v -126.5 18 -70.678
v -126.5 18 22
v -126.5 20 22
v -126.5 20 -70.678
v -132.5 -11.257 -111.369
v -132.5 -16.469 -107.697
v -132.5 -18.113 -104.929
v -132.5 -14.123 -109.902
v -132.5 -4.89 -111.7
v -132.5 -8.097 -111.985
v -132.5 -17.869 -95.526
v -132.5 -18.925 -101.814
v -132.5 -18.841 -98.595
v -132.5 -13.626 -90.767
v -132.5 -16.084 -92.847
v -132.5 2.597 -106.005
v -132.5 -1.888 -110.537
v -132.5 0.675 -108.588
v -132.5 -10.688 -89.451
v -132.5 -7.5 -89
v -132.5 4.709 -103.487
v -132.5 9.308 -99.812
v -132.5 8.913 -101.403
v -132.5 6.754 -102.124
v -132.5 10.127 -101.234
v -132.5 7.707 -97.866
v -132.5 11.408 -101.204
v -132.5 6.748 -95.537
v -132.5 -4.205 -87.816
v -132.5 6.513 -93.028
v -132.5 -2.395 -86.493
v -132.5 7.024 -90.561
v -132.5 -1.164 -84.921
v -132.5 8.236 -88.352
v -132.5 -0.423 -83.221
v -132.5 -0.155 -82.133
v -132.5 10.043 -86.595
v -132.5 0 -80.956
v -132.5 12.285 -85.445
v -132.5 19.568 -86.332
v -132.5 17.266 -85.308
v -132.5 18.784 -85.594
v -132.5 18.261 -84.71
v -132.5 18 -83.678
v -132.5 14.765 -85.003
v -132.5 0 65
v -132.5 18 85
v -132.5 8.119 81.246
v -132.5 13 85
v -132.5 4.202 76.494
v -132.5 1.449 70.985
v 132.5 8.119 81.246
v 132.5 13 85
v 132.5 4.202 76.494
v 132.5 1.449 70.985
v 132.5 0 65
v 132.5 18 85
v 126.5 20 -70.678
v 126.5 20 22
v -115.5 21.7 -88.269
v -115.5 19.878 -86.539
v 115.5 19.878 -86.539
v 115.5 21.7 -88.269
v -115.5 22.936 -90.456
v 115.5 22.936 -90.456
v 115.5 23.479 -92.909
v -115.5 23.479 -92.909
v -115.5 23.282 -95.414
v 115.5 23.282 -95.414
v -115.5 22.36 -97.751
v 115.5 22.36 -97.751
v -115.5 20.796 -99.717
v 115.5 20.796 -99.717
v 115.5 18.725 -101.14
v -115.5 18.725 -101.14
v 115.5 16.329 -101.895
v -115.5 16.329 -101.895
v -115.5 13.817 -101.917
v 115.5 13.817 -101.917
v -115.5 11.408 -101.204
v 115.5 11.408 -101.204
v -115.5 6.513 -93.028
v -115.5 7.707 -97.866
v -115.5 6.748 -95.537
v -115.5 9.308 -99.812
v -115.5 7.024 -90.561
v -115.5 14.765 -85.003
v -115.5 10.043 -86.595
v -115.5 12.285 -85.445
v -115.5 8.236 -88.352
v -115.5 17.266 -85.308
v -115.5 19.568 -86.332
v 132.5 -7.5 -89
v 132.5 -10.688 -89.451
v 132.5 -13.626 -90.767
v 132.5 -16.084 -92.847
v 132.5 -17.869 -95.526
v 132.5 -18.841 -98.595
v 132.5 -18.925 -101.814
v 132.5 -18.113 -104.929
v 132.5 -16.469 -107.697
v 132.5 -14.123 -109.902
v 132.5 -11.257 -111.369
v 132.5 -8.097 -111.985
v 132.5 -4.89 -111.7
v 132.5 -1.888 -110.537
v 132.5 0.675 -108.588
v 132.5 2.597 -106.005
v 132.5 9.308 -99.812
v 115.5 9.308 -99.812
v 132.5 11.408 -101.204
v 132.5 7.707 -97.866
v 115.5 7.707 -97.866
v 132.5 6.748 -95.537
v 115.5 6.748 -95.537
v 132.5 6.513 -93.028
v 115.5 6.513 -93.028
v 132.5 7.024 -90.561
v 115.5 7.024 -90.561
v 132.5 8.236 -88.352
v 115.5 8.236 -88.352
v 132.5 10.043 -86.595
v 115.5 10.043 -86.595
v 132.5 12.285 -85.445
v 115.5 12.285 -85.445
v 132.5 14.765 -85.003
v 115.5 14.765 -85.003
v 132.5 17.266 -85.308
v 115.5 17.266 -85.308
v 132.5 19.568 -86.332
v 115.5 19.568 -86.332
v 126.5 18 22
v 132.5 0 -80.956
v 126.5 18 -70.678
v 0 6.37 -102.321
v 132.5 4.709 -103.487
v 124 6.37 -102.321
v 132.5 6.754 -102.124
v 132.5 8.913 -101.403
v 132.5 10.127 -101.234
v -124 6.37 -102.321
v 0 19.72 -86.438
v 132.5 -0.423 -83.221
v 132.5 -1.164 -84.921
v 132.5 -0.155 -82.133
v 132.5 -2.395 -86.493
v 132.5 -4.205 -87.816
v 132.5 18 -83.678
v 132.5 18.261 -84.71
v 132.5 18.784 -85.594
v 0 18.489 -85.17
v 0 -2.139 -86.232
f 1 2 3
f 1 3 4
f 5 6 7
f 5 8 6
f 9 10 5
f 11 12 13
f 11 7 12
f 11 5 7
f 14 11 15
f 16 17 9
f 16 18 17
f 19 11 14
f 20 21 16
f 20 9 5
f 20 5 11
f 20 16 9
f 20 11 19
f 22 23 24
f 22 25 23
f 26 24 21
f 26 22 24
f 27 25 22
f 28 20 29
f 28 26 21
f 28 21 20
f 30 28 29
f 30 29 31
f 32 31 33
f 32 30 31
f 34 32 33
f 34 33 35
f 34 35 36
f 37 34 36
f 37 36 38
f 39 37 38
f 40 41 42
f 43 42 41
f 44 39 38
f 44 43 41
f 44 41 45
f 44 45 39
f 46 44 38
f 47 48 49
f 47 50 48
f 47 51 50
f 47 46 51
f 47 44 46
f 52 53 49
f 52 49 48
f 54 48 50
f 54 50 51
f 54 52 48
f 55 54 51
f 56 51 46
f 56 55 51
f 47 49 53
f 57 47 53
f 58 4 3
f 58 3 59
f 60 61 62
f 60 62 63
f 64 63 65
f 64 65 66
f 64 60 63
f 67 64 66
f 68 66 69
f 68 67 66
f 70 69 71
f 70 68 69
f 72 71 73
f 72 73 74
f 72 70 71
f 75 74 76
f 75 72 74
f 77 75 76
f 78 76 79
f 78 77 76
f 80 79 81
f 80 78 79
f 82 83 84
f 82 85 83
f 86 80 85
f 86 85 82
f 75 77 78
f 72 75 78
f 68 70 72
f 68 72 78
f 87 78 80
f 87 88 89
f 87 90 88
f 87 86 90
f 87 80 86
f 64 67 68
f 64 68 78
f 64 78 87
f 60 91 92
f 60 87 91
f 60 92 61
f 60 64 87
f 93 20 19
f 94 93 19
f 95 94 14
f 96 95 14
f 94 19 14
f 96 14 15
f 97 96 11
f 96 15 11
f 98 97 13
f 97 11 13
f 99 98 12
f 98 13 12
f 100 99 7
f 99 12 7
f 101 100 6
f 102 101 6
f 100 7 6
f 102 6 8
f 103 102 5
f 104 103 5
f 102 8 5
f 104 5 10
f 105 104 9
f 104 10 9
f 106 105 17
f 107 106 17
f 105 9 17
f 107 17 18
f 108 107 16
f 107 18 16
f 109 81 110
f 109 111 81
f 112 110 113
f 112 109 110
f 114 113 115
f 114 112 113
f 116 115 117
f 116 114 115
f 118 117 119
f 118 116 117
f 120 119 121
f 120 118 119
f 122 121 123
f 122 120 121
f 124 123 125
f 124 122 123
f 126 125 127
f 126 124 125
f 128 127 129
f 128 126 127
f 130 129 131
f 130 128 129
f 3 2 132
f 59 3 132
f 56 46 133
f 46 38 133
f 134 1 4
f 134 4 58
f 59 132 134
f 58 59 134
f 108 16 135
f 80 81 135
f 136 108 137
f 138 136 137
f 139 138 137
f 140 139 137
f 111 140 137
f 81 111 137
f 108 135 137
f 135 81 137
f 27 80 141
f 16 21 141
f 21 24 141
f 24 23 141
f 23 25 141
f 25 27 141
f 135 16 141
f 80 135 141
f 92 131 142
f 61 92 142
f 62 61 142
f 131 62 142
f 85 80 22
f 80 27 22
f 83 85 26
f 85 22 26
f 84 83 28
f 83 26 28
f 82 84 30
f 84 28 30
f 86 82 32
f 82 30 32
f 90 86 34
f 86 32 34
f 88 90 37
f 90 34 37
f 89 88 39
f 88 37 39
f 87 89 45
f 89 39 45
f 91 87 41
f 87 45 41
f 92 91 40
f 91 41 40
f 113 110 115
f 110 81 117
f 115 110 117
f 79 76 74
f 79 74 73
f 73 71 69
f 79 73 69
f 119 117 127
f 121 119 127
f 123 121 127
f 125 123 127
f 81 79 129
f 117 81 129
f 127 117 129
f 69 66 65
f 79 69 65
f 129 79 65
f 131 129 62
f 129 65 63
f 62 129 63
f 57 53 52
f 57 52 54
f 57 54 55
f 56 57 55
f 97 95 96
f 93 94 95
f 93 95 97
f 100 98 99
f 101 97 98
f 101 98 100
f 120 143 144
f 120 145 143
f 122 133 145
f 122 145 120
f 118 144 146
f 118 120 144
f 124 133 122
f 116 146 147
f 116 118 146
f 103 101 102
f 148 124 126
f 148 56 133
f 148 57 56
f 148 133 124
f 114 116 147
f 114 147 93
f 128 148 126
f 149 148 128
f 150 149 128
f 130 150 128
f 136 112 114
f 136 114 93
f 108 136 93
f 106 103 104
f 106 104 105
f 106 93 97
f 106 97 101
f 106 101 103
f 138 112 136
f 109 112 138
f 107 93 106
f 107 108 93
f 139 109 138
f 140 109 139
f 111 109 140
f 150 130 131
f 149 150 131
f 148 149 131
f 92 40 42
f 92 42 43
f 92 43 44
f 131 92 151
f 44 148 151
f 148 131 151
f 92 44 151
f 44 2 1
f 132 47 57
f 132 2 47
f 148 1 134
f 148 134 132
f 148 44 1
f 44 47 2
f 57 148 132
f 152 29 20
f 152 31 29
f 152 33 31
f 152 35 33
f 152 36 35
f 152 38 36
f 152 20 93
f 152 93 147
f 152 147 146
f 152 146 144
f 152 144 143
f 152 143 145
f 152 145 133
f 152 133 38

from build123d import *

# Parameters (mm, degrees)
SKETCH1_W               = 265
SKETCH1_H               = 170
BOSS_EXTRUDE1_DEPTH     = 18
CUT_EXTRUDE1_DEPTH      = 1
CUT_EXTRUDE1_DEPTH_BACK = 266
BOSS_EXTRUDE2_DEPTH     = 265
SKETCH4_W               = 253
SKETCH4_H               = 92.678428724
BOSS_EXTRUDE3_DEPTH     = 2
BOSS_EXTRUDE4_DEPTH     = 265
SKETCH8_R               = 8.5
CUT_EXTRUDE3_DEPTH      = 17


with BuildPart() as part:
    # Sketch1 → Boss-Extrude1 (new body)
    with BuildSketch(Plane(origin=(0, 0, 0), x_dir=(1, 0, 0), z_dir=(0, 1, 0))):
        Rectangle(SKETCH1_W, SKETCH1_H)
    extrude(amount=BOSS_EXTRUDE1_DEPTH)

    # Sketch2 → Cut-Extrude1 (cut, two sides)
    with BuildSketch(Plane(origin=(132.5, 0, 0), x_dir=(0, 0, -1), z_dir=(1, 0, 0))) as cut_extrude1_sk:
        with BuildLine():
            Line((-266.258489167, 313.568151134), (-85, 13))
            ThreePointArc((-85, 13), (-76.493710292, 4.201984165), (-65, 0))
            Line((-65, 0), (283.270913158, -43.625960377))
            Line((283.270913158, -43.625960377), (-99.302917842, -632.201084994))
            Line((-99.302917842, -632.201084994), (-648.832320167, -275.006973483))
            Line((-648.832320167, -275.006973483), (-266.258489167, 313.568151134))
        make_face()
    extrude(amount=CUT_EXTRUDE1_DEPTH, mode=Mode.SUBTRACT)
    extrude(cut_extrude1_sk.sketch, amount=-CUT_EXTRUDE1_DEPTH_BACK, mode=Mode.SUBTRACT)

    # Sketch3 → Boss-Extrude2 (add)
    with BuildSketch(Plane.ZY.offset(132.5)):
        with BuildLine():
            ThreePointArc((-85, 15), (-88.140347905, 8.402718027), (-95.24097163, 6.680203261))
            add(Edge.make_bspline(
                [(-95.24097163, 6.680203261), (-89.327681397, 4.618052191), (-85, 0)],
                knots=[0, 0, 0, 1, 1, 1], degree=2))
            Line((-85, 0), (-85, 15))
        make_face()
        with BuildLine():
            add(Edge.make_bspline(
                [(-86.53925872, 19.878327668), (-86.439507091, 19.716554468), (-86.33208607, 19.568480042)],
                knots=[0, 0, 0, 0.074961469, 0.074961469, 0.074961469], degree=2))
            ThreePointArc((-86.53925872, 19.878327668), (-100.596416051, 19.678768987), (-95.24097163, 6.680203261))
            ThreePointArc((-95.24097163, 6.680203261), (-88.140347905, 8.402718027), (-85, 15))
            ThreePointArc((-85, 15), (-85.339814083, 17.379362477), (-86.33208607, 19.568480042))
        make_face()
        with BuildLine():
            add(Edge.make_bspline(
                [(-86.33208607, 19.568480042), (-85.335385171, 18.194578424), (-83.678428785, 18)],
                knots=[0.074961469, 0.074961469, 0.074961469, 0.770487944, 0.770487944, 0.770487944], degree=2))
            ThreePointArc((-86.33208607, 19.568480042), (-85.339814083, 17.379362477), (-85, 15))
            Line((-85, 15), (-85, 18))
            Line((-85, 18), (-83.678428785, 18))
        make_face()
    extrude(amount=-BOSS_EXTRUDE2_DEPTH)

    # Sketch4 → Boss-Extrude3 (add)
    with BuildSketch(Plane(origin=(0, 18, 0), x_dir=(1, 0, 0), z_dir=(0, 1, 0))):
        with Locations((0, 24.339214362)):
            Rectangle(SKETCH4_W, SKETCH4_H)
    extrude(amount=BOSS_EXTRUDE3_DEPTH)

    # Sketch6 → Boss-Extrude4 (add)
    with BuildSketch(Plane.ZY.offset(132.5)):
        with BuildLine():
            Line((-101.203779097, 11.408094152), (-78.679249537, 0))
            add(Edge.make_bspline(
                [(-89, -7.5), (-87.236541116, 0.615126939), (-78.679249537, 0)],
                knots=[0, 0, 0, 1, 1, 1], degree=2))
            ThreePointArc((-89, -7.5), (-106.371084282, -17.388395692), (-106.005281627, 2.596626873))
            add(Edge.make_bspline(
                [(-106.005281627, 2.596626873), (-101.037094557, 5.737965522), (-101.203779097, 11.408094152)],
                knots=[0, 0, 0, 1, 1, 1], degree=2))
        make_face()
    extrude(amount=-BOSS_EXTRUDE4_DEPTH)

    # Sketch8 → Cut-Extrude3 (cut)
    with BuildSketch(Plane.ZY.offset(132.5)):
        with Locations((-93.5, 15)):
            Circle(SKETCH8_R)
    cut_extrude3 = extrude(amount=-CUT_EXTRUDE3_DEPTH, mode=Mode.SUBTRACT)

    # Mirror1: Cut-Extrude3 across plane
    add(cut_extrude3.mirror(Plane(origin=(0, 0, 0), x_dir=(0, 0, 1), z_dir=(1, 0, 0))), mode=Mode.SUBTRACT)


solid = part.part
